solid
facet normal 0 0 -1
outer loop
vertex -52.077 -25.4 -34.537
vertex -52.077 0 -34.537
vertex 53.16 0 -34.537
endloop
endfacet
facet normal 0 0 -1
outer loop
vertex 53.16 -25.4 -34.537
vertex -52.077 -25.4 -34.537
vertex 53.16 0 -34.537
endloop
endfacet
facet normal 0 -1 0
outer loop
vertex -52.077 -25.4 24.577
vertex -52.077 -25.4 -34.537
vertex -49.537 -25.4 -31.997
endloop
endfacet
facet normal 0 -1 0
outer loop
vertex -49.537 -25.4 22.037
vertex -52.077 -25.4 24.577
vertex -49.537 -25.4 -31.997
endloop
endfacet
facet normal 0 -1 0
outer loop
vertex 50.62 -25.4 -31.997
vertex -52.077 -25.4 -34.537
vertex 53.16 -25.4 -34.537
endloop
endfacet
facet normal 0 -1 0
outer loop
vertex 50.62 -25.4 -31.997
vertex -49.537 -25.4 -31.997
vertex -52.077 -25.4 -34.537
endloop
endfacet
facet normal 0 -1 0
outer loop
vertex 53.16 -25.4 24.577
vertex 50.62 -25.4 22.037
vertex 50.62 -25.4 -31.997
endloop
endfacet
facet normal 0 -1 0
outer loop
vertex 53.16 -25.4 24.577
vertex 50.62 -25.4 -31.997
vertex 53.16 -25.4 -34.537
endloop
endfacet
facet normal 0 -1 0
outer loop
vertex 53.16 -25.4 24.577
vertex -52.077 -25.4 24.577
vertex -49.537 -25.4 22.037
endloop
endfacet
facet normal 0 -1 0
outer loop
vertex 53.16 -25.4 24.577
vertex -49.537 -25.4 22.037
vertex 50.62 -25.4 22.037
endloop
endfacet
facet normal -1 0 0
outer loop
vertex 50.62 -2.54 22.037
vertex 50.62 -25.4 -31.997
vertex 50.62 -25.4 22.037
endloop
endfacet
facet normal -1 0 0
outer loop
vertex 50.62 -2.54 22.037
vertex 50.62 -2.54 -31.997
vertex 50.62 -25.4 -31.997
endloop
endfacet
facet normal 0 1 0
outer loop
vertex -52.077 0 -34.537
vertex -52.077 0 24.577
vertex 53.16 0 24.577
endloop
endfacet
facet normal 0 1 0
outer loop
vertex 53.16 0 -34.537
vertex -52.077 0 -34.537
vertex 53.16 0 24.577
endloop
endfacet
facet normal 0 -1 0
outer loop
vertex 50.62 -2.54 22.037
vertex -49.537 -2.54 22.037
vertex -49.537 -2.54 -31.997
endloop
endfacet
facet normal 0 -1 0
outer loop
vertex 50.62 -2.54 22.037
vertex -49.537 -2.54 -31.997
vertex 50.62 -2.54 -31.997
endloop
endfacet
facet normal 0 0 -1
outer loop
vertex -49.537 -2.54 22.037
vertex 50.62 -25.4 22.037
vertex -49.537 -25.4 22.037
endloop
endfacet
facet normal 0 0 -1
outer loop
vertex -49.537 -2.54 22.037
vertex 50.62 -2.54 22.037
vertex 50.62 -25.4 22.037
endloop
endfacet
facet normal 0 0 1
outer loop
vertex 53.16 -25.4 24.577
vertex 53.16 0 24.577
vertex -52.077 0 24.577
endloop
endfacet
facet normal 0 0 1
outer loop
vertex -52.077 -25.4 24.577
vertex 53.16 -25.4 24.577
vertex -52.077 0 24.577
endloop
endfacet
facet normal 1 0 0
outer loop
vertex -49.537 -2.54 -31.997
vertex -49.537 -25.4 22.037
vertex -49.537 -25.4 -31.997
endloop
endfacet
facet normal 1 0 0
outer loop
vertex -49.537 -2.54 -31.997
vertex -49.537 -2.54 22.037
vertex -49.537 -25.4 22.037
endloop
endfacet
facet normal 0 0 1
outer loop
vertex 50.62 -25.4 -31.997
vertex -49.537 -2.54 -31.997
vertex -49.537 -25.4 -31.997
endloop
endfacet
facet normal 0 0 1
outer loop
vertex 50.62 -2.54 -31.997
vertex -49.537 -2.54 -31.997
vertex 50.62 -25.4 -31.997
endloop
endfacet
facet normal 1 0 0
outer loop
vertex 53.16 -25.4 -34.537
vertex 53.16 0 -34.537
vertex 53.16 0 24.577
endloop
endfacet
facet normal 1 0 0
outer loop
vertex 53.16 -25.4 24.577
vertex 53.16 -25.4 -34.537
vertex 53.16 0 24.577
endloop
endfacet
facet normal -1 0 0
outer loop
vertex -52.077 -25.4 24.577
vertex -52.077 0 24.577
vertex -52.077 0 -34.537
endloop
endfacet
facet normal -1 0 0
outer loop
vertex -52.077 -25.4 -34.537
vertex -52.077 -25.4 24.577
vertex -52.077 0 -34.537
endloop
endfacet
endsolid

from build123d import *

# Parameters (mm, degrees)
F1_DEPTH = 25.4
F2_T     = -2.54


with BuildPart() as f1:
    # F0 (on Front) → F1 (new body)
    with BuildSketch(Plane.XZ):
        Polygon((-32.8051820397, 24.5768204331), (-52.0768724382, 24.5768204331), (-52.0768724382, -34.5374681056), (-21.7618532479, -34.5374681056), align=None)
        Polygon((53.1595535576, 24.5768204331), (-32.8051820397, 24.5768204331), (-21.7618532479, -34.5374681056), (53.1595535576, -34.5374681056), align=None)
    extrude(amount=F1_DEPTH)

    # F2
    f2_openings = [f1.faces().sort_by_distance(p)[0] for p in [
        (0.541341, -25.4, -4.980324),
    ]]
    offset(amount=F2_T, openings=f2_openings)


solid = f1.part
